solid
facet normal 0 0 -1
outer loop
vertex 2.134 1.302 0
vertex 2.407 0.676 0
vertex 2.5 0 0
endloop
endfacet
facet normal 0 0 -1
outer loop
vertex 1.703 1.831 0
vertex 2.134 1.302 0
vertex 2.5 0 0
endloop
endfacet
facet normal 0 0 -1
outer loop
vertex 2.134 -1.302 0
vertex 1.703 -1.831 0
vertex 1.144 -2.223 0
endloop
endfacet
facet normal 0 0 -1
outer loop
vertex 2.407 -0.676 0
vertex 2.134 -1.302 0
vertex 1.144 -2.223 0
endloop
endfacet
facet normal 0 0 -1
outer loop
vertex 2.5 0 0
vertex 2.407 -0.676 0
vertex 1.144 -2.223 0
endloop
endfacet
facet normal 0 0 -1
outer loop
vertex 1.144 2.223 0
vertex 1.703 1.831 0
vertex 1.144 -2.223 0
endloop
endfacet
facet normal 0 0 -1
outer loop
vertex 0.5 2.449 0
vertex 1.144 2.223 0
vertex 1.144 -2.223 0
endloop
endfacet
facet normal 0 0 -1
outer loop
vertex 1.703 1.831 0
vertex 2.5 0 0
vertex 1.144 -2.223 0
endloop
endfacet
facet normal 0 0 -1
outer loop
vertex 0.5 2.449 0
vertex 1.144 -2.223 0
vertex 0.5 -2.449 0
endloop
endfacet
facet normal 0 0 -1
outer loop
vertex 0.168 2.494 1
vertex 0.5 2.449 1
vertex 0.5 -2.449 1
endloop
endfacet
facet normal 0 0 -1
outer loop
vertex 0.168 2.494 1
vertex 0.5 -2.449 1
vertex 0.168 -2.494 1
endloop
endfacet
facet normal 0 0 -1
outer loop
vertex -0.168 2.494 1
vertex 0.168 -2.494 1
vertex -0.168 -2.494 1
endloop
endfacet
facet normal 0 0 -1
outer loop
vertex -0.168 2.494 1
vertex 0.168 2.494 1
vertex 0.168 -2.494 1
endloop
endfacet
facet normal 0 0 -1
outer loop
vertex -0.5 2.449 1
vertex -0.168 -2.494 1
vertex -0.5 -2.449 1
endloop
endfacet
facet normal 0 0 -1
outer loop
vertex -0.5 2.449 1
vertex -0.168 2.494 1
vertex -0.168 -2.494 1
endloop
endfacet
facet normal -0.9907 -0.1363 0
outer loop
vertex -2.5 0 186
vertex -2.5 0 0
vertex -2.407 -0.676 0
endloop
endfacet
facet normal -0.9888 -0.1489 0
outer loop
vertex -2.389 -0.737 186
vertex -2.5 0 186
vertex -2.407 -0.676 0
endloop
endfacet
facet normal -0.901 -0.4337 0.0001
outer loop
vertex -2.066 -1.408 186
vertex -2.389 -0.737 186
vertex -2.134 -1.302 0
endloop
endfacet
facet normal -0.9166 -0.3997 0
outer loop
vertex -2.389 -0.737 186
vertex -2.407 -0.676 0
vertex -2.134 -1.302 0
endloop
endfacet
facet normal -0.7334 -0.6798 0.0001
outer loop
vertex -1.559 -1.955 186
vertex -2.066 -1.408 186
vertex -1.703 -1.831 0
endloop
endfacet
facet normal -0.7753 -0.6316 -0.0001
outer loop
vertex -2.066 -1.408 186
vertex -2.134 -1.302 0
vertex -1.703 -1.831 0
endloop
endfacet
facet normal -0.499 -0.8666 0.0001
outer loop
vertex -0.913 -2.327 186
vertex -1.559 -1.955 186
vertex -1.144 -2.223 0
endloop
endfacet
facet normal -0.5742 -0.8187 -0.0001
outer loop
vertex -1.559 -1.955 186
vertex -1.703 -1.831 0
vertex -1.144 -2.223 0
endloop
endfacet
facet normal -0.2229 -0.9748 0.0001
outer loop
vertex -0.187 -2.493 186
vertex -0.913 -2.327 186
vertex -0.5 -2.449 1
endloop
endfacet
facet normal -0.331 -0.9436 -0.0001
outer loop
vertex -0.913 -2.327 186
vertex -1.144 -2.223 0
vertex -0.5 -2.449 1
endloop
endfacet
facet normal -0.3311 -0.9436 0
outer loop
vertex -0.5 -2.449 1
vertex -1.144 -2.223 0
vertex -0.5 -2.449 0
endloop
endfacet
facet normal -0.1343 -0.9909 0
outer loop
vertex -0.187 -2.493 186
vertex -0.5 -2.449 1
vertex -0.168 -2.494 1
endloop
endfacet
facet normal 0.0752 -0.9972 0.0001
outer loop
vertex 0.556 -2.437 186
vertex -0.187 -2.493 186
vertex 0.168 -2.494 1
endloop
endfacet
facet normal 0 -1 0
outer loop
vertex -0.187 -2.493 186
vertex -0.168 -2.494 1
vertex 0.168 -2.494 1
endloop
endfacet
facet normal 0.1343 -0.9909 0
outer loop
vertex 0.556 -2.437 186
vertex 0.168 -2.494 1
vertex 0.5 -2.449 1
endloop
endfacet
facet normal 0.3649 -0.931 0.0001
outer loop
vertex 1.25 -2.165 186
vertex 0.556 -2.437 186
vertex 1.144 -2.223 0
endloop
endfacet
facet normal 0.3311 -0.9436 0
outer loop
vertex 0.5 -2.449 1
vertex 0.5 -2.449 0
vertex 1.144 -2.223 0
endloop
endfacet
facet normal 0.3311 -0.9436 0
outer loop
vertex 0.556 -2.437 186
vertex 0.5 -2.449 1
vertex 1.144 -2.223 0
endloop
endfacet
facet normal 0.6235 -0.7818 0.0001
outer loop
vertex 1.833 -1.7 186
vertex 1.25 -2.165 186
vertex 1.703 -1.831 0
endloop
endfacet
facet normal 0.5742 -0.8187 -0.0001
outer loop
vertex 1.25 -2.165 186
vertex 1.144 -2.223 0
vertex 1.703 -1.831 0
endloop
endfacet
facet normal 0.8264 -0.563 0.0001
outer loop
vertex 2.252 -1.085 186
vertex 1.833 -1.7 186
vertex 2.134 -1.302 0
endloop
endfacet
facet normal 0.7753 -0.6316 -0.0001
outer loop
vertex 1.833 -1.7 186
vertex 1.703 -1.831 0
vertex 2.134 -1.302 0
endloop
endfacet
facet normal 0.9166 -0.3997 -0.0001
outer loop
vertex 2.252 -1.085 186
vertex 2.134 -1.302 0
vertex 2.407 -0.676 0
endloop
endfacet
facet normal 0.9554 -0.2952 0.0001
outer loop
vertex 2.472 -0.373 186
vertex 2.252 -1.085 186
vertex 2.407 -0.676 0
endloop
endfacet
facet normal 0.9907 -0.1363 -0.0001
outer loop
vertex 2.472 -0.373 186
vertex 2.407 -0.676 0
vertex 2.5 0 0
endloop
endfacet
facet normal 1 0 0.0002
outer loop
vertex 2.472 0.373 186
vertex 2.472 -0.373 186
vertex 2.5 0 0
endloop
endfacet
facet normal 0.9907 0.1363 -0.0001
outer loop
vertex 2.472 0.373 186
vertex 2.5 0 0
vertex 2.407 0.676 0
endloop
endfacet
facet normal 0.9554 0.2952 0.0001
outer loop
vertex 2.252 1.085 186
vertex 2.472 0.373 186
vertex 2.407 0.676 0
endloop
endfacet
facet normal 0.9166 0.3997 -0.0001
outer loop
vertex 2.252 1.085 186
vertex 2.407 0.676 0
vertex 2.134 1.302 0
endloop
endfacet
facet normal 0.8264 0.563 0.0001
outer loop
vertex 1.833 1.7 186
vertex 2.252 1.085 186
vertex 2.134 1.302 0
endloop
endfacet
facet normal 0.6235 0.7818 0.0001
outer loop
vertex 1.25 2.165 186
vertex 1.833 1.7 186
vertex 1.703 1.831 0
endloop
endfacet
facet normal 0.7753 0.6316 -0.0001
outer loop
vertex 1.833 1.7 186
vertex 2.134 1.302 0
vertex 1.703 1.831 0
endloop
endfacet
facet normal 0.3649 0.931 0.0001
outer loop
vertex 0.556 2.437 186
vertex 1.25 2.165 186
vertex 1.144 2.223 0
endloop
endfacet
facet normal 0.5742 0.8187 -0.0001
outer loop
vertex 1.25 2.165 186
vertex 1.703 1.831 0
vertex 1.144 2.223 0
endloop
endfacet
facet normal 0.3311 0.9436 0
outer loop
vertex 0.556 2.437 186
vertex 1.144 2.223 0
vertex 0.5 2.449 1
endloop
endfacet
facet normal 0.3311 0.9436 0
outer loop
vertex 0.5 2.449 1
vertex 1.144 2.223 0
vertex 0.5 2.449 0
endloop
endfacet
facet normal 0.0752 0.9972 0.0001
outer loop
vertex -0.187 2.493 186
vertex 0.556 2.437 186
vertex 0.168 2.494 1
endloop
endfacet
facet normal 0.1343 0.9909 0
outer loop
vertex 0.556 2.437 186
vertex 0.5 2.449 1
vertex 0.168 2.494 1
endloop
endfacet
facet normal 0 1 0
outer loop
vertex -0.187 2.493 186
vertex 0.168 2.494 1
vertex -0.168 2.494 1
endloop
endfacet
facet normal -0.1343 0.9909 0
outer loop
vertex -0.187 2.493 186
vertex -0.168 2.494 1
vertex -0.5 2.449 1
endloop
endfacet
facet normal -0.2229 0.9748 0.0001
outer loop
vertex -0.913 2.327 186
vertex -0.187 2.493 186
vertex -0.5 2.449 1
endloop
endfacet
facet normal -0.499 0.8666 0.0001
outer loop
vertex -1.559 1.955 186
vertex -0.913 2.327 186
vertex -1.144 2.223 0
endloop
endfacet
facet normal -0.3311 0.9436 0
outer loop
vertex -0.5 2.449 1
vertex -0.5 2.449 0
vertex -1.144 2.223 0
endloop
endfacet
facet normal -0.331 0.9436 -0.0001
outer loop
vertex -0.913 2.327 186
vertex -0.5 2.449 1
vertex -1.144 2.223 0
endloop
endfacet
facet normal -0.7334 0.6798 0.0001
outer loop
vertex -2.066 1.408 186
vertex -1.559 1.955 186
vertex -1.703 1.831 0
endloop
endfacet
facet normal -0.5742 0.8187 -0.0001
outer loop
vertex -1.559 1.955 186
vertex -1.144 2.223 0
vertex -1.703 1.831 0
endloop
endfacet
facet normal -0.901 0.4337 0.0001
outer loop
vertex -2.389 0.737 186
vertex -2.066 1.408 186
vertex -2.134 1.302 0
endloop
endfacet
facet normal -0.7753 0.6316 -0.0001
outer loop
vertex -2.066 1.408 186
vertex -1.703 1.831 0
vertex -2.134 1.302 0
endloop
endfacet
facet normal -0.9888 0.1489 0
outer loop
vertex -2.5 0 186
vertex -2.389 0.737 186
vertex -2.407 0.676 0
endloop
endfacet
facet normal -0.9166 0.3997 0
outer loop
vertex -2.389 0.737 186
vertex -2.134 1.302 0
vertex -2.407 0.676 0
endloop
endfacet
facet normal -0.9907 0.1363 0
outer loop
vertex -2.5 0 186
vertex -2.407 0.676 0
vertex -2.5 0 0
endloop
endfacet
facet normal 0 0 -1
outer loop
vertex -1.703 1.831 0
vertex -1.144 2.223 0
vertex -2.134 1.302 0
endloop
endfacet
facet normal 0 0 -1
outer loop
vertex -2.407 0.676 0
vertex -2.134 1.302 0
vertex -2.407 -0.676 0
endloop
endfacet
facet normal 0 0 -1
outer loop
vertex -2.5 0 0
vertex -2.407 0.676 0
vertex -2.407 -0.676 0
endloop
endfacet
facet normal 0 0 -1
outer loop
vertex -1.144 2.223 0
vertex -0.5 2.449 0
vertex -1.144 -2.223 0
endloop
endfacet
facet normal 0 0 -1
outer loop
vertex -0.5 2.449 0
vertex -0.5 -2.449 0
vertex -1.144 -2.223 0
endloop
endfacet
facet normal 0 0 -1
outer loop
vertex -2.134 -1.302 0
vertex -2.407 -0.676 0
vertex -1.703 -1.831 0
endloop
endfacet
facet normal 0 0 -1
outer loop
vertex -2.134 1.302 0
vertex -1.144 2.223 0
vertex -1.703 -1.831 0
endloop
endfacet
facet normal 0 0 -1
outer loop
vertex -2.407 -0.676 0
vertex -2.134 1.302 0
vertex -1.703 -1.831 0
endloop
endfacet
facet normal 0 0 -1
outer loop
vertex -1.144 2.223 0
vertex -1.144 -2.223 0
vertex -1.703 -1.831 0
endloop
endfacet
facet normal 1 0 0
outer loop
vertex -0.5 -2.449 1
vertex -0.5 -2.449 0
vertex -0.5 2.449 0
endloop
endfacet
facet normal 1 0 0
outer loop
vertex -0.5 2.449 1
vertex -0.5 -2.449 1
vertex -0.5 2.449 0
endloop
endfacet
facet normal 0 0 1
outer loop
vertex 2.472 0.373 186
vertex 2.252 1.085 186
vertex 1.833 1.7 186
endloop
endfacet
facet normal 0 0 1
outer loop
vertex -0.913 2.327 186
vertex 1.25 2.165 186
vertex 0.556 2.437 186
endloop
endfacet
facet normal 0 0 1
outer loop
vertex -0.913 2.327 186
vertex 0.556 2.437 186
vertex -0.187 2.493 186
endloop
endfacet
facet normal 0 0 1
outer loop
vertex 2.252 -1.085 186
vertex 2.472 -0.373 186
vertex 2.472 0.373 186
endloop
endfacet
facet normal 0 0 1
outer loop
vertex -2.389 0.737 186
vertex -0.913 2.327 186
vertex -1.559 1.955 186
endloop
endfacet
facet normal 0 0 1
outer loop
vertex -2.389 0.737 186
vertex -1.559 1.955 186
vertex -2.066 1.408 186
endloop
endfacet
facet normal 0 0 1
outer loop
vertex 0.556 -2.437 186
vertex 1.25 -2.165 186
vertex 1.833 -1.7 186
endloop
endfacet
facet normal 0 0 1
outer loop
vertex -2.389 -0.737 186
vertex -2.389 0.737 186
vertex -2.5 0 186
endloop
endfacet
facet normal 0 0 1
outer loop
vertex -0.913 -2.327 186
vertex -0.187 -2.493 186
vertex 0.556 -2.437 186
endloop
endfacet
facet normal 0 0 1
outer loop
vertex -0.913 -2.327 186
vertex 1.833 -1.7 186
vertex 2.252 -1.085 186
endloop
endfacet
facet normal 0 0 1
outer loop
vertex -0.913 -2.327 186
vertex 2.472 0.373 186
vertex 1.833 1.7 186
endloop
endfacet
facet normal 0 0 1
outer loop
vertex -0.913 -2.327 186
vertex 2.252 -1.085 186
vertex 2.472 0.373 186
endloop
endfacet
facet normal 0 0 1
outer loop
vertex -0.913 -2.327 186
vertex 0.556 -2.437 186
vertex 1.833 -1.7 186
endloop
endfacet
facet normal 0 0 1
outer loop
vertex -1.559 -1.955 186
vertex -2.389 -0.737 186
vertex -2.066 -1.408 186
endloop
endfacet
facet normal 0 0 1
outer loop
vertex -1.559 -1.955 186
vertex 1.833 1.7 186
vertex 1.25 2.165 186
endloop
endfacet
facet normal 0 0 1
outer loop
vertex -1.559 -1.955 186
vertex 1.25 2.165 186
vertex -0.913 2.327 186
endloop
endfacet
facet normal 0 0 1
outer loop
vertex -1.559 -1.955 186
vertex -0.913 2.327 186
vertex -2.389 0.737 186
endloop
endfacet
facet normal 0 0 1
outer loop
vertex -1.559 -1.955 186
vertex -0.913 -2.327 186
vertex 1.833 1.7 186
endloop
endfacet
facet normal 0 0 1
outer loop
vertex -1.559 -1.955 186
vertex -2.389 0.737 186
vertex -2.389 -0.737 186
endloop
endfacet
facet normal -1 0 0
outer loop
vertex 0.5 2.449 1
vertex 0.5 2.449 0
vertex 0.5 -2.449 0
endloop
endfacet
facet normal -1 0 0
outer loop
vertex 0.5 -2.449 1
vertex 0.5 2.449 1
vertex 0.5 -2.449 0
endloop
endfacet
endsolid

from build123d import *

# Parameters (mm, degrees)
ESQUISSE1_R             = 2.5
BOSS_EXTRU_1_DEPTH      = 186
ENL_V_MAT_EXTRU_1_DEPTH = 1


with BuildPart() as part:
    # Esquisse1 → Boss.-Extru.1 (new body)
    with BuildSketch(Plane.XY):
        with Locations(Location((0, 0, 0), (0, 0, 180))):
            Circle(ESQUISSE1_R)
    extrude(amount=BOSS_EXTRU_1_DEPTH)

    # Esquisse2 → Enlèv. mat.-Extru.1 (cut)
    with BuildSketch(Plane(origin=(0, 0, 0), x_dir=(-1, 0, 0), z_dir=(0, 0, -1))):
        with BuildLine():
            Line((-0.5, 2.449489743), (-0.5, -2.449489743))
            ThreePointArc((-0.5, -2.449489743), (0, -2.5), (0.5, -2.449489743))
            Line((0.5, -2.449489743), (0.5, 2.449489743))
            ThreePointArc((0.5, 2.449489743), (0, 2.5), (-0.5, 2.449489743))
        make_face()
    extrude(amount=-ENL_V_MAT_EXTRU_1_DEPTH, mode=Mode.SUBTRACT)


solid = part.part
